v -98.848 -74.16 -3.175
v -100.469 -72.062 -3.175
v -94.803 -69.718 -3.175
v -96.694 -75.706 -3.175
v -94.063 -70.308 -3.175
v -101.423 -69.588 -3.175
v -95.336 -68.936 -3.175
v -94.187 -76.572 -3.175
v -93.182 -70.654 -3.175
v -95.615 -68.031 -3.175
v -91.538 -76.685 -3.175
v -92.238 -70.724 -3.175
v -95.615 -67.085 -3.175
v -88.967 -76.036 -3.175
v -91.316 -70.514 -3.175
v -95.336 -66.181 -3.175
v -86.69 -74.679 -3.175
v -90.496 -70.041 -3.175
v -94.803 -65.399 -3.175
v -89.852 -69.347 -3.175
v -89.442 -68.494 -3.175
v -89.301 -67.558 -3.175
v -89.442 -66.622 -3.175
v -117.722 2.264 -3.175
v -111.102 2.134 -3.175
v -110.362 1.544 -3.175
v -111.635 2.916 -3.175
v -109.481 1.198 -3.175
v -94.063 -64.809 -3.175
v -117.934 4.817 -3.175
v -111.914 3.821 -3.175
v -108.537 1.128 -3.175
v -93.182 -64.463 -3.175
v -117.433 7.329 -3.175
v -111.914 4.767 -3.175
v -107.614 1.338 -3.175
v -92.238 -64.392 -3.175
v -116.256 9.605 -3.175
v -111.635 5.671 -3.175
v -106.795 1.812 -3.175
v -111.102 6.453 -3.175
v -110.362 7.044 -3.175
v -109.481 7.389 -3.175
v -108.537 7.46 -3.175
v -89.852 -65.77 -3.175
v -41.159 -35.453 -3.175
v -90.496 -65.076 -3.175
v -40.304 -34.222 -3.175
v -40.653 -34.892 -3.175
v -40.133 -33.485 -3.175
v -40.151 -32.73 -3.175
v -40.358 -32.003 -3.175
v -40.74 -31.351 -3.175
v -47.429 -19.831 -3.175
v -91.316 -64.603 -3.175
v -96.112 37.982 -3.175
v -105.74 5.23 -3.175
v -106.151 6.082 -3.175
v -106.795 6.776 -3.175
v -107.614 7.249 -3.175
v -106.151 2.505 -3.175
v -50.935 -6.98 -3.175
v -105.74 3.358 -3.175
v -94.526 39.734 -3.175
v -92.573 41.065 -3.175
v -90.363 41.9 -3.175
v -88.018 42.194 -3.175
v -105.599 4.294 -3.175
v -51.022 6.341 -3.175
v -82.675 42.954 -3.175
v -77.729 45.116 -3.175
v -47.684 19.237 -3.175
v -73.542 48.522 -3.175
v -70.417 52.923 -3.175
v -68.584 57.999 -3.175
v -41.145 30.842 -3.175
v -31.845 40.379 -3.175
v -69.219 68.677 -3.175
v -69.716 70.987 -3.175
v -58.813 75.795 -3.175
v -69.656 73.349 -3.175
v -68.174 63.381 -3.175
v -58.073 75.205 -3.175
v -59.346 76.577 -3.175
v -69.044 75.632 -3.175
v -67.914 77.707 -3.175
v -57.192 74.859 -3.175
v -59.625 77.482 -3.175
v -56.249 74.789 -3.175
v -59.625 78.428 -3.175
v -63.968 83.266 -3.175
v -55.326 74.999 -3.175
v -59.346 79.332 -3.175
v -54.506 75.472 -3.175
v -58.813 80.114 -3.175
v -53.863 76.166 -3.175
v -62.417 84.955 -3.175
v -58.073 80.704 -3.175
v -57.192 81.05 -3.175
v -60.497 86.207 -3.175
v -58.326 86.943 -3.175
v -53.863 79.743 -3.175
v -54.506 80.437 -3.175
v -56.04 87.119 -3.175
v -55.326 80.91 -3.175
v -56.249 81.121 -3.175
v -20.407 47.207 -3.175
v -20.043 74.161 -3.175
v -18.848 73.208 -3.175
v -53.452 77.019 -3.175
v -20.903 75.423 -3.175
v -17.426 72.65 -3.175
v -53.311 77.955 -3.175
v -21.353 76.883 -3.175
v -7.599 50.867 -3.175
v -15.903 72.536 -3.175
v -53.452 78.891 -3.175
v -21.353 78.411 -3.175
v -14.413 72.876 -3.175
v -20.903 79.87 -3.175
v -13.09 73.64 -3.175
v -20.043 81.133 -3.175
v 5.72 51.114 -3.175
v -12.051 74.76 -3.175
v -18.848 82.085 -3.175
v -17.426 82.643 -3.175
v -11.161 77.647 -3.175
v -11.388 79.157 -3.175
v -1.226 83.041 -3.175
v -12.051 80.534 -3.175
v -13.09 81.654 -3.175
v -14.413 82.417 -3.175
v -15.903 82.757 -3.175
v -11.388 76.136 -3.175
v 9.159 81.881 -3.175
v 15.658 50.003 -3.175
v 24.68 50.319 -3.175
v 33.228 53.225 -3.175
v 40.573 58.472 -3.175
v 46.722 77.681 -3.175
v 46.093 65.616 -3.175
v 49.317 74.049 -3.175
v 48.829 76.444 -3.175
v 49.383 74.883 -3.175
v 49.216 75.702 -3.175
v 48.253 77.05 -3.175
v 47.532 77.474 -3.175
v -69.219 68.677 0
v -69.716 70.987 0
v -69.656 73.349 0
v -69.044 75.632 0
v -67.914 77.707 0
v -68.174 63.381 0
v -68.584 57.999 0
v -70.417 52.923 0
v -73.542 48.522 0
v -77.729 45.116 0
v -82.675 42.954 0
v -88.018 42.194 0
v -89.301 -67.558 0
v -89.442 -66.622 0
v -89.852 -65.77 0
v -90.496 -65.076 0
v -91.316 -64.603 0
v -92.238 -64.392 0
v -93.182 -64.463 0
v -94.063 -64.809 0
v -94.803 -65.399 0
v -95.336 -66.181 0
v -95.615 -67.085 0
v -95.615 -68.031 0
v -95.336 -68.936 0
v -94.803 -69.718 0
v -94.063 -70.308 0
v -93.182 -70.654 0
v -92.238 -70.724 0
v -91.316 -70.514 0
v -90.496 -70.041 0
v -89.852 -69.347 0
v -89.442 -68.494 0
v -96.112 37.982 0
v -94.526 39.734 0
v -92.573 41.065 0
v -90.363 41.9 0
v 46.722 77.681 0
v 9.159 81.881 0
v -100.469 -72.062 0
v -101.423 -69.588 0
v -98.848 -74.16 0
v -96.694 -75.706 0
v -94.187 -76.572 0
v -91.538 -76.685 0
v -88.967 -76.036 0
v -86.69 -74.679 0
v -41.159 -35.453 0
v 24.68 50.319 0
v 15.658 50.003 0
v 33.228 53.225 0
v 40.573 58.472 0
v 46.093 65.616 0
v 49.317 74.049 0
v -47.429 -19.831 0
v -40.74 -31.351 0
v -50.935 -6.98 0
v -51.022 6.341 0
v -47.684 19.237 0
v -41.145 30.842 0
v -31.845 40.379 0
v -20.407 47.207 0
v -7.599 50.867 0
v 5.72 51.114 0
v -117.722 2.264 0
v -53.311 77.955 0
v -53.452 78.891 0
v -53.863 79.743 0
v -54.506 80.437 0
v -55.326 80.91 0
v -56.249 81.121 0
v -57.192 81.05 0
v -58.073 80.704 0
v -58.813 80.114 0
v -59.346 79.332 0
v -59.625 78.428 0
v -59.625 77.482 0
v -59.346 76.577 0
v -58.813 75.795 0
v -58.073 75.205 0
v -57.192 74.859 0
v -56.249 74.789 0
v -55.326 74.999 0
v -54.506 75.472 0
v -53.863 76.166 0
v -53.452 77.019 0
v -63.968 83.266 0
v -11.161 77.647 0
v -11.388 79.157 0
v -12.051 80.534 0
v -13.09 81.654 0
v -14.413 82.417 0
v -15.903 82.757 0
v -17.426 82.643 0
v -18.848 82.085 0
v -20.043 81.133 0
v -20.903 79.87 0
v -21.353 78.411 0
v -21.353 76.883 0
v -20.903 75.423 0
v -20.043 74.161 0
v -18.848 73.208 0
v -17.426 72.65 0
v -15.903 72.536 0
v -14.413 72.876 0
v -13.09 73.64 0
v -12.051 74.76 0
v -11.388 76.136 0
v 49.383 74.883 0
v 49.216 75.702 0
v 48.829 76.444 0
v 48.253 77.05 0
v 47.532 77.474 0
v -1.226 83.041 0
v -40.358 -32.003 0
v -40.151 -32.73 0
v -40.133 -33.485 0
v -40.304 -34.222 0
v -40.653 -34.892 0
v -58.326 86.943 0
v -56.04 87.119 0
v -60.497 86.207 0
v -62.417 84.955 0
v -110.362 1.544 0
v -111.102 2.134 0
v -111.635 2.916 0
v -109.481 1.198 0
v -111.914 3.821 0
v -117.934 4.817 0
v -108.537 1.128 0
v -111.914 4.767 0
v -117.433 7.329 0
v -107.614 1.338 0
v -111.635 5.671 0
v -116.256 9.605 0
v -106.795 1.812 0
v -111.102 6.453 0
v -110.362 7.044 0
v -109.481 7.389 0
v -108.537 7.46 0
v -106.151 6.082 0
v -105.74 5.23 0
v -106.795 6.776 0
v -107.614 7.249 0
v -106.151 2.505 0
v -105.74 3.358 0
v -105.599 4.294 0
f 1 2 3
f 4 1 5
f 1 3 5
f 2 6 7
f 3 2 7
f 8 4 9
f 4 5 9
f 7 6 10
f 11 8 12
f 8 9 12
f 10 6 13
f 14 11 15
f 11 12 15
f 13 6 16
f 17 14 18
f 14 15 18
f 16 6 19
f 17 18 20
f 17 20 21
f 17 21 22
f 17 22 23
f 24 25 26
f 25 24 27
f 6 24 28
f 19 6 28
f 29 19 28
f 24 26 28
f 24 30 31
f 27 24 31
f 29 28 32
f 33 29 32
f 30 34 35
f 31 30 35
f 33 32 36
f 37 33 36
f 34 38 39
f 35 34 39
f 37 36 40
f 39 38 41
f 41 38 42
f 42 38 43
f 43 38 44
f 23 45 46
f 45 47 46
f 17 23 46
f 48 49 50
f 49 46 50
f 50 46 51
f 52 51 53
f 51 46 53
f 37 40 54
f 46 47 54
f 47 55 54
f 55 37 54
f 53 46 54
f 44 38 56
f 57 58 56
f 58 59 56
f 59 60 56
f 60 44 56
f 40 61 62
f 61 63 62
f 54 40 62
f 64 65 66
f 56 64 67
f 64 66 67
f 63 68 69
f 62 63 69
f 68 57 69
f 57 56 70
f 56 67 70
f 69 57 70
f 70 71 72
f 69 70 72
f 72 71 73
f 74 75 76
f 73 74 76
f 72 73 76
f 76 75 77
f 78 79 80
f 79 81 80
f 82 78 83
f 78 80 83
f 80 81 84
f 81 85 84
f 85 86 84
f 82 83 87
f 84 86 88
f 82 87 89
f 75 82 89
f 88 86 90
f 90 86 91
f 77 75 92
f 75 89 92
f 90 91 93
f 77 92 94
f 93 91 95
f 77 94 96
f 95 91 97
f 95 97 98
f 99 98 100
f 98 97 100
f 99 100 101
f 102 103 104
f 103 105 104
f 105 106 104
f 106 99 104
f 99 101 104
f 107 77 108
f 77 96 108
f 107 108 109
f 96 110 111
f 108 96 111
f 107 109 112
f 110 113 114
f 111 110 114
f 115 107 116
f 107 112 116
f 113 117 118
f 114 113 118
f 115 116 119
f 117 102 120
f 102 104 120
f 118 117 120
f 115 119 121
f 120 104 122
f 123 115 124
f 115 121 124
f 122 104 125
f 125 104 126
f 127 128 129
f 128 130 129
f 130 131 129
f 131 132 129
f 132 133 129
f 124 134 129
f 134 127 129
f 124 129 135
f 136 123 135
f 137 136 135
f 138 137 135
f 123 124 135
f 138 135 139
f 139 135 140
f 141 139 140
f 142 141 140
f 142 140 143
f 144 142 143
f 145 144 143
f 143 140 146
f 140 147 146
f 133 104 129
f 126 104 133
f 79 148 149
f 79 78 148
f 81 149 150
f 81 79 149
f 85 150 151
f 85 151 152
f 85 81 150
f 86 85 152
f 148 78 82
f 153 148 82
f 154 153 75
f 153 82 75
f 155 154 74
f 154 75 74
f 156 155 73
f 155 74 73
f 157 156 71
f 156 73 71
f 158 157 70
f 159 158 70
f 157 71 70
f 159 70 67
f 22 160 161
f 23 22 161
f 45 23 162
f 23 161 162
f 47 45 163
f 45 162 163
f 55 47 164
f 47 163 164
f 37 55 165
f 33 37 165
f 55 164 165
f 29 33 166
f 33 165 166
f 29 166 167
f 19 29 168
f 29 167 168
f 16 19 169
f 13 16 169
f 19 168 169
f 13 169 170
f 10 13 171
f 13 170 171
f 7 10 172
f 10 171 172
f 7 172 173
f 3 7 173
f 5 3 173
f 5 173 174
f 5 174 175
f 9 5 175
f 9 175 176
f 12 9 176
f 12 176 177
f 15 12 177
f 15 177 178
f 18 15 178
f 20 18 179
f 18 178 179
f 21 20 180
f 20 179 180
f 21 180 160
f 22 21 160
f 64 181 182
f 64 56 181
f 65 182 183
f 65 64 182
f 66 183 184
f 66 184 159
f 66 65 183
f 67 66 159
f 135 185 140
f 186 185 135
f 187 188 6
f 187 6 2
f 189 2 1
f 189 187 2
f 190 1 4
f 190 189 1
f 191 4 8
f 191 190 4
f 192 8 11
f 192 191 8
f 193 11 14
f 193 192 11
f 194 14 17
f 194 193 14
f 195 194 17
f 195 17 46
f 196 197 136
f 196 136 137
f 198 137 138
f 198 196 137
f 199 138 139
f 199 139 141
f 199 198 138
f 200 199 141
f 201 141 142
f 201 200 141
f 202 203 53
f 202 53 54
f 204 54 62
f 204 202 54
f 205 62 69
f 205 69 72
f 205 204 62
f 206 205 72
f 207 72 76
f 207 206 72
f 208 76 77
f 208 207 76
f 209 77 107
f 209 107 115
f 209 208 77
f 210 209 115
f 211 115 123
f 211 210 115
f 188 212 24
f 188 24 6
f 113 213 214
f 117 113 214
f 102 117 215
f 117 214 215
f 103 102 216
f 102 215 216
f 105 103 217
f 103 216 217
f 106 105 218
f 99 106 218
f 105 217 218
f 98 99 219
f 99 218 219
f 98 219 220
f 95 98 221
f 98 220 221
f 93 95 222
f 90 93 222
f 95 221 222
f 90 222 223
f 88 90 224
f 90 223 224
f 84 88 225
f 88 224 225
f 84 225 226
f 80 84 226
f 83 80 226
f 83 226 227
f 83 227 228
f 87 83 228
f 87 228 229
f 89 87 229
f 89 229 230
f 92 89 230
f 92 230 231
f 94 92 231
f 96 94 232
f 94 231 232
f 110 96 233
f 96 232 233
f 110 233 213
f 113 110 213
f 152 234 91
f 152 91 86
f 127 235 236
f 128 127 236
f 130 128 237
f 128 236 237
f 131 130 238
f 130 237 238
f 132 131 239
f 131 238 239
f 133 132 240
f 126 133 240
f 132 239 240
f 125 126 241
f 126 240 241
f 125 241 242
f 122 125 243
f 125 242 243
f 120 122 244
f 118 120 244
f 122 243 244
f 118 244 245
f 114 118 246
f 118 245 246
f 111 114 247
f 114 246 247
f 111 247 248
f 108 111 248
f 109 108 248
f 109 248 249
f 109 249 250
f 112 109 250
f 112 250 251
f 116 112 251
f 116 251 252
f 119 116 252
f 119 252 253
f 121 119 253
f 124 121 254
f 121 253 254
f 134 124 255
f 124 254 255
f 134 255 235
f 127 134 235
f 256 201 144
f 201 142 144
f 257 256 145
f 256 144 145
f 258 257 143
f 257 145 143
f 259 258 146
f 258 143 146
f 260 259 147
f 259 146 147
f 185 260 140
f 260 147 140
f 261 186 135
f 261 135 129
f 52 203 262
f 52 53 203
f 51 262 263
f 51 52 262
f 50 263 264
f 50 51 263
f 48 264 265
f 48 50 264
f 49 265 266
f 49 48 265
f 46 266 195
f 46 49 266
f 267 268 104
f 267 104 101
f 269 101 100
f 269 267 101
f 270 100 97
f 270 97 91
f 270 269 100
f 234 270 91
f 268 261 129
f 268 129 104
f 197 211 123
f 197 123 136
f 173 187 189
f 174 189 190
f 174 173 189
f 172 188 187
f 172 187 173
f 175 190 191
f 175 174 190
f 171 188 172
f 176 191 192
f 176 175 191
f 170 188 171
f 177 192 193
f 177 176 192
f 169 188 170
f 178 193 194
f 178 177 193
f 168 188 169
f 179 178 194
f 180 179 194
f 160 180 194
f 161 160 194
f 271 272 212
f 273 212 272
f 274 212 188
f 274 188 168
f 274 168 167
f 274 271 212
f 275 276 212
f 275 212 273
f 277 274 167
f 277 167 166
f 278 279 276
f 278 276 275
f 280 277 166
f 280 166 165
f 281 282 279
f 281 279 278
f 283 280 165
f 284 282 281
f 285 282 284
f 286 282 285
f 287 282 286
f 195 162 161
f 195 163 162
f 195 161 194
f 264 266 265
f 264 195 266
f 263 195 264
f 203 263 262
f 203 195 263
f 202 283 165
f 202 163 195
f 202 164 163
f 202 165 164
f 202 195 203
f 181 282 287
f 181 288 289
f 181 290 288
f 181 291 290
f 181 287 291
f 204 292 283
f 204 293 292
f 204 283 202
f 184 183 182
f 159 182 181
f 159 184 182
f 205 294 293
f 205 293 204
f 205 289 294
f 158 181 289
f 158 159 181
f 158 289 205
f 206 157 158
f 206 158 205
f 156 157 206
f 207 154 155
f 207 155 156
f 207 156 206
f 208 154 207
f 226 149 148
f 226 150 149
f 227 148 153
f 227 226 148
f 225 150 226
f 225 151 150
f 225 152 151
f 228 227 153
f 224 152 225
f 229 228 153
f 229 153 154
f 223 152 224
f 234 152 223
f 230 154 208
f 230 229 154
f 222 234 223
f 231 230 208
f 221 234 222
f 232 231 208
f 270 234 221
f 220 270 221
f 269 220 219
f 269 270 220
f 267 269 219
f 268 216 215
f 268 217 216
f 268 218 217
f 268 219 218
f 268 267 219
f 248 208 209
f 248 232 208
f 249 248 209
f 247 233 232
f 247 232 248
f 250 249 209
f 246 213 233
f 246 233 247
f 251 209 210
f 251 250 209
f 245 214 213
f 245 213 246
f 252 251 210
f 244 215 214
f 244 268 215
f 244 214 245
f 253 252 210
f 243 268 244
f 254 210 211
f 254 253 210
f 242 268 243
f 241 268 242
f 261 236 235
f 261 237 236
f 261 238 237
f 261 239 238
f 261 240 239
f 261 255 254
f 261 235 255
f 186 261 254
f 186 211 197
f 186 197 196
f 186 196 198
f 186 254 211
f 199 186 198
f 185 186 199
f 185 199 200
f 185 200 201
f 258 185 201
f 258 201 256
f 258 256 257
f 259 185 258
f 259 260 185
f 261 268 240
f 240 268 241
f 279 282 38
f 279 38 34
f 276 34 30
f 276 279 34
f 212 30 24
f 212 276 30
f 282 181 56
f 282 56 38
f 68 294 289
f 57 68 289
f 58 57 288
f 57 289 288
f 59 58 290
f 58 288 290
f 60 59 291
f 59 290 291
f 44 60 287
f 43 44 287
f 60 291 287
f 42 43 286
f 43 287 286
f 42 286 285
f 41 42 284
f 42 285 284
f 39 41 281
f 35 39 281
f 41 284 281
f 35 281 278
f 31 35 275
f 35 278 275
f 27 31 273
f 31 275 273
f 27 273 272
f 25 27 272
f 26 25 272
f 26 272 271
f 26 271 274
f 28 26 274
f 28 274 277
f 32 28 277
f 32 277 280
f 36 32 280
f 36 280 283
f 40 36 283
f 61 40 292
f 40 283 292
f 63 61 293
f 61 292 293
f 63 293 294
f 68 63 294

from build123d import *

# Parameters (mm, degrees)
SKETCH1_R           = 5.125
SKETCH1_R_2         = 3.175
BOSS_EXTRUDE1_DEPTH = 3.175
BOSS_EXTRUDE2_DEPTH = 3.175
FILLET1_R           = 3
FILLET2_R           = 3
SKETCH3_R           = 20
CUT_EXTRUDE1_DEPTH  = 10
FILLET3_R           = 10


with BuildPart() as part:
    # Sketch1 → Boss-Extrude1 (new body)
    with BuildSketch(Plane.XY):
        with BuildLine():
            Line((9.15916732, 81.880500013), (-1.226057593, 83.041443199))
            Line((-1.226057593, 83.041443199), (-56.039685464, 87.118947137))
            ThreePointArc((-56.039685464, 87.118947137), (-60.496641192, 86.206716079), (-63.967502721, 83.265672028))
            Line((-63.967502721, 83.265672028), (-116.255829355, 9.604754379))
            ThreePointArc((-116.255829355, 9.604754379), (-117.771483022, 6.090804864), (-117.721858217, 2.264241835))
            Line((-117.721858217, 2.264241835), (-101.423346554, -69.587878569))
            ThreePointArc((-101.423346554, -69.587878569), (-95.471980909, -76.230183562), (-86.689504727, -74.678706588))
            Line((-86.689504727, -74.678706588), (-38.949070428, -33.549176271))
            ThreePointArc((-38.949070428, -33.549176271), (-45.470819677, 24.007252392), (5.719870058, 51.114243705))
            Line((5.719870058, 51.114243705), (9.15916732, 81.880500013))
        make_face()
        with Locations((-16.285724201, 77.64676563)):
            Circle(SKETCH1_R, mode=Mode.SUBTRACT)
        with Locations((-56.48584008, 77.954801184)):
            Circle(SKETCH1_R_2, mode=Mode.SUBTRACT)
        with Locations((-108.774166869, 4.293883316)):
            Circle(SKETCH1_R_2, mode=Mode.SUBTRACT)
        with Locations((-92.47565523, -67.558236985)):
            Circle(SKETCH1_R_2, mode=Mode.SUBTRACT)
    extrude(amount=-BOSS_EXTRUDE1_DEPTH)

    # Sketch2 → Boss-Extrude2 (add)
    with BuildSketch(Plane.XY):
        with BuildLine():
            Line((9.15916732, 81.880500013), (5.719870058, 51.114243705))
            Line((5.719870058, 51.114243705), (15.657966891, 50.003284059))
            ThreePointArc((15.657966891, 50.003284059), (38.420342204, 56.582561483), (49.863520461, 77.330243105))
            Line((49.863520461, 77.330243105), (9.15916732, 81.880500013))
        make_face()
    extrude(amount=-BOSS_EXTRUDE2_DEPTH)

    # Fillet1
    fillet1_edges = [part.edges().sort_by_distance(p)[0] for p in [
        (49.863520461, 77.330243105, -1.5875),
    ]]
    fillet(fillet1_edges, radius=FILLET1_R)

    # Fillet2
    fillet2_edges = [part.edges().sort_by_distance(p)[0] for p in [
        (-38.949070428, -33.549176271, -1.5875),
    ]]
    fillet(fillet2_edges, radius=FILLET2_R)

    # Sketch3 → Cut-Extrude1 (cut)
    with BuildSketch(Plane(origin=(0, 0, -3.175), x_dir=(-1, 0, 0), z_dir=(0, 0, -1))):
        with Locations((88.139089591, 62.193219725)):
            Circle(SKETCH3_R)
    extrude(amount=-CUT_EXTRUDE1_DEPTH, mode=Mode.SUBTRACT)

    # Fillet3
    fillet3_edges = [part.edges().sort_by_distance(p)[0] for p in [
        (-71.283801873, 72.958872327, -1.5875),
        (-92.741786186, 42.730044649, -1.5875),
    ]]
    fillet(fillet3_edges, radius=FILLET3_R)


solid = part.part
